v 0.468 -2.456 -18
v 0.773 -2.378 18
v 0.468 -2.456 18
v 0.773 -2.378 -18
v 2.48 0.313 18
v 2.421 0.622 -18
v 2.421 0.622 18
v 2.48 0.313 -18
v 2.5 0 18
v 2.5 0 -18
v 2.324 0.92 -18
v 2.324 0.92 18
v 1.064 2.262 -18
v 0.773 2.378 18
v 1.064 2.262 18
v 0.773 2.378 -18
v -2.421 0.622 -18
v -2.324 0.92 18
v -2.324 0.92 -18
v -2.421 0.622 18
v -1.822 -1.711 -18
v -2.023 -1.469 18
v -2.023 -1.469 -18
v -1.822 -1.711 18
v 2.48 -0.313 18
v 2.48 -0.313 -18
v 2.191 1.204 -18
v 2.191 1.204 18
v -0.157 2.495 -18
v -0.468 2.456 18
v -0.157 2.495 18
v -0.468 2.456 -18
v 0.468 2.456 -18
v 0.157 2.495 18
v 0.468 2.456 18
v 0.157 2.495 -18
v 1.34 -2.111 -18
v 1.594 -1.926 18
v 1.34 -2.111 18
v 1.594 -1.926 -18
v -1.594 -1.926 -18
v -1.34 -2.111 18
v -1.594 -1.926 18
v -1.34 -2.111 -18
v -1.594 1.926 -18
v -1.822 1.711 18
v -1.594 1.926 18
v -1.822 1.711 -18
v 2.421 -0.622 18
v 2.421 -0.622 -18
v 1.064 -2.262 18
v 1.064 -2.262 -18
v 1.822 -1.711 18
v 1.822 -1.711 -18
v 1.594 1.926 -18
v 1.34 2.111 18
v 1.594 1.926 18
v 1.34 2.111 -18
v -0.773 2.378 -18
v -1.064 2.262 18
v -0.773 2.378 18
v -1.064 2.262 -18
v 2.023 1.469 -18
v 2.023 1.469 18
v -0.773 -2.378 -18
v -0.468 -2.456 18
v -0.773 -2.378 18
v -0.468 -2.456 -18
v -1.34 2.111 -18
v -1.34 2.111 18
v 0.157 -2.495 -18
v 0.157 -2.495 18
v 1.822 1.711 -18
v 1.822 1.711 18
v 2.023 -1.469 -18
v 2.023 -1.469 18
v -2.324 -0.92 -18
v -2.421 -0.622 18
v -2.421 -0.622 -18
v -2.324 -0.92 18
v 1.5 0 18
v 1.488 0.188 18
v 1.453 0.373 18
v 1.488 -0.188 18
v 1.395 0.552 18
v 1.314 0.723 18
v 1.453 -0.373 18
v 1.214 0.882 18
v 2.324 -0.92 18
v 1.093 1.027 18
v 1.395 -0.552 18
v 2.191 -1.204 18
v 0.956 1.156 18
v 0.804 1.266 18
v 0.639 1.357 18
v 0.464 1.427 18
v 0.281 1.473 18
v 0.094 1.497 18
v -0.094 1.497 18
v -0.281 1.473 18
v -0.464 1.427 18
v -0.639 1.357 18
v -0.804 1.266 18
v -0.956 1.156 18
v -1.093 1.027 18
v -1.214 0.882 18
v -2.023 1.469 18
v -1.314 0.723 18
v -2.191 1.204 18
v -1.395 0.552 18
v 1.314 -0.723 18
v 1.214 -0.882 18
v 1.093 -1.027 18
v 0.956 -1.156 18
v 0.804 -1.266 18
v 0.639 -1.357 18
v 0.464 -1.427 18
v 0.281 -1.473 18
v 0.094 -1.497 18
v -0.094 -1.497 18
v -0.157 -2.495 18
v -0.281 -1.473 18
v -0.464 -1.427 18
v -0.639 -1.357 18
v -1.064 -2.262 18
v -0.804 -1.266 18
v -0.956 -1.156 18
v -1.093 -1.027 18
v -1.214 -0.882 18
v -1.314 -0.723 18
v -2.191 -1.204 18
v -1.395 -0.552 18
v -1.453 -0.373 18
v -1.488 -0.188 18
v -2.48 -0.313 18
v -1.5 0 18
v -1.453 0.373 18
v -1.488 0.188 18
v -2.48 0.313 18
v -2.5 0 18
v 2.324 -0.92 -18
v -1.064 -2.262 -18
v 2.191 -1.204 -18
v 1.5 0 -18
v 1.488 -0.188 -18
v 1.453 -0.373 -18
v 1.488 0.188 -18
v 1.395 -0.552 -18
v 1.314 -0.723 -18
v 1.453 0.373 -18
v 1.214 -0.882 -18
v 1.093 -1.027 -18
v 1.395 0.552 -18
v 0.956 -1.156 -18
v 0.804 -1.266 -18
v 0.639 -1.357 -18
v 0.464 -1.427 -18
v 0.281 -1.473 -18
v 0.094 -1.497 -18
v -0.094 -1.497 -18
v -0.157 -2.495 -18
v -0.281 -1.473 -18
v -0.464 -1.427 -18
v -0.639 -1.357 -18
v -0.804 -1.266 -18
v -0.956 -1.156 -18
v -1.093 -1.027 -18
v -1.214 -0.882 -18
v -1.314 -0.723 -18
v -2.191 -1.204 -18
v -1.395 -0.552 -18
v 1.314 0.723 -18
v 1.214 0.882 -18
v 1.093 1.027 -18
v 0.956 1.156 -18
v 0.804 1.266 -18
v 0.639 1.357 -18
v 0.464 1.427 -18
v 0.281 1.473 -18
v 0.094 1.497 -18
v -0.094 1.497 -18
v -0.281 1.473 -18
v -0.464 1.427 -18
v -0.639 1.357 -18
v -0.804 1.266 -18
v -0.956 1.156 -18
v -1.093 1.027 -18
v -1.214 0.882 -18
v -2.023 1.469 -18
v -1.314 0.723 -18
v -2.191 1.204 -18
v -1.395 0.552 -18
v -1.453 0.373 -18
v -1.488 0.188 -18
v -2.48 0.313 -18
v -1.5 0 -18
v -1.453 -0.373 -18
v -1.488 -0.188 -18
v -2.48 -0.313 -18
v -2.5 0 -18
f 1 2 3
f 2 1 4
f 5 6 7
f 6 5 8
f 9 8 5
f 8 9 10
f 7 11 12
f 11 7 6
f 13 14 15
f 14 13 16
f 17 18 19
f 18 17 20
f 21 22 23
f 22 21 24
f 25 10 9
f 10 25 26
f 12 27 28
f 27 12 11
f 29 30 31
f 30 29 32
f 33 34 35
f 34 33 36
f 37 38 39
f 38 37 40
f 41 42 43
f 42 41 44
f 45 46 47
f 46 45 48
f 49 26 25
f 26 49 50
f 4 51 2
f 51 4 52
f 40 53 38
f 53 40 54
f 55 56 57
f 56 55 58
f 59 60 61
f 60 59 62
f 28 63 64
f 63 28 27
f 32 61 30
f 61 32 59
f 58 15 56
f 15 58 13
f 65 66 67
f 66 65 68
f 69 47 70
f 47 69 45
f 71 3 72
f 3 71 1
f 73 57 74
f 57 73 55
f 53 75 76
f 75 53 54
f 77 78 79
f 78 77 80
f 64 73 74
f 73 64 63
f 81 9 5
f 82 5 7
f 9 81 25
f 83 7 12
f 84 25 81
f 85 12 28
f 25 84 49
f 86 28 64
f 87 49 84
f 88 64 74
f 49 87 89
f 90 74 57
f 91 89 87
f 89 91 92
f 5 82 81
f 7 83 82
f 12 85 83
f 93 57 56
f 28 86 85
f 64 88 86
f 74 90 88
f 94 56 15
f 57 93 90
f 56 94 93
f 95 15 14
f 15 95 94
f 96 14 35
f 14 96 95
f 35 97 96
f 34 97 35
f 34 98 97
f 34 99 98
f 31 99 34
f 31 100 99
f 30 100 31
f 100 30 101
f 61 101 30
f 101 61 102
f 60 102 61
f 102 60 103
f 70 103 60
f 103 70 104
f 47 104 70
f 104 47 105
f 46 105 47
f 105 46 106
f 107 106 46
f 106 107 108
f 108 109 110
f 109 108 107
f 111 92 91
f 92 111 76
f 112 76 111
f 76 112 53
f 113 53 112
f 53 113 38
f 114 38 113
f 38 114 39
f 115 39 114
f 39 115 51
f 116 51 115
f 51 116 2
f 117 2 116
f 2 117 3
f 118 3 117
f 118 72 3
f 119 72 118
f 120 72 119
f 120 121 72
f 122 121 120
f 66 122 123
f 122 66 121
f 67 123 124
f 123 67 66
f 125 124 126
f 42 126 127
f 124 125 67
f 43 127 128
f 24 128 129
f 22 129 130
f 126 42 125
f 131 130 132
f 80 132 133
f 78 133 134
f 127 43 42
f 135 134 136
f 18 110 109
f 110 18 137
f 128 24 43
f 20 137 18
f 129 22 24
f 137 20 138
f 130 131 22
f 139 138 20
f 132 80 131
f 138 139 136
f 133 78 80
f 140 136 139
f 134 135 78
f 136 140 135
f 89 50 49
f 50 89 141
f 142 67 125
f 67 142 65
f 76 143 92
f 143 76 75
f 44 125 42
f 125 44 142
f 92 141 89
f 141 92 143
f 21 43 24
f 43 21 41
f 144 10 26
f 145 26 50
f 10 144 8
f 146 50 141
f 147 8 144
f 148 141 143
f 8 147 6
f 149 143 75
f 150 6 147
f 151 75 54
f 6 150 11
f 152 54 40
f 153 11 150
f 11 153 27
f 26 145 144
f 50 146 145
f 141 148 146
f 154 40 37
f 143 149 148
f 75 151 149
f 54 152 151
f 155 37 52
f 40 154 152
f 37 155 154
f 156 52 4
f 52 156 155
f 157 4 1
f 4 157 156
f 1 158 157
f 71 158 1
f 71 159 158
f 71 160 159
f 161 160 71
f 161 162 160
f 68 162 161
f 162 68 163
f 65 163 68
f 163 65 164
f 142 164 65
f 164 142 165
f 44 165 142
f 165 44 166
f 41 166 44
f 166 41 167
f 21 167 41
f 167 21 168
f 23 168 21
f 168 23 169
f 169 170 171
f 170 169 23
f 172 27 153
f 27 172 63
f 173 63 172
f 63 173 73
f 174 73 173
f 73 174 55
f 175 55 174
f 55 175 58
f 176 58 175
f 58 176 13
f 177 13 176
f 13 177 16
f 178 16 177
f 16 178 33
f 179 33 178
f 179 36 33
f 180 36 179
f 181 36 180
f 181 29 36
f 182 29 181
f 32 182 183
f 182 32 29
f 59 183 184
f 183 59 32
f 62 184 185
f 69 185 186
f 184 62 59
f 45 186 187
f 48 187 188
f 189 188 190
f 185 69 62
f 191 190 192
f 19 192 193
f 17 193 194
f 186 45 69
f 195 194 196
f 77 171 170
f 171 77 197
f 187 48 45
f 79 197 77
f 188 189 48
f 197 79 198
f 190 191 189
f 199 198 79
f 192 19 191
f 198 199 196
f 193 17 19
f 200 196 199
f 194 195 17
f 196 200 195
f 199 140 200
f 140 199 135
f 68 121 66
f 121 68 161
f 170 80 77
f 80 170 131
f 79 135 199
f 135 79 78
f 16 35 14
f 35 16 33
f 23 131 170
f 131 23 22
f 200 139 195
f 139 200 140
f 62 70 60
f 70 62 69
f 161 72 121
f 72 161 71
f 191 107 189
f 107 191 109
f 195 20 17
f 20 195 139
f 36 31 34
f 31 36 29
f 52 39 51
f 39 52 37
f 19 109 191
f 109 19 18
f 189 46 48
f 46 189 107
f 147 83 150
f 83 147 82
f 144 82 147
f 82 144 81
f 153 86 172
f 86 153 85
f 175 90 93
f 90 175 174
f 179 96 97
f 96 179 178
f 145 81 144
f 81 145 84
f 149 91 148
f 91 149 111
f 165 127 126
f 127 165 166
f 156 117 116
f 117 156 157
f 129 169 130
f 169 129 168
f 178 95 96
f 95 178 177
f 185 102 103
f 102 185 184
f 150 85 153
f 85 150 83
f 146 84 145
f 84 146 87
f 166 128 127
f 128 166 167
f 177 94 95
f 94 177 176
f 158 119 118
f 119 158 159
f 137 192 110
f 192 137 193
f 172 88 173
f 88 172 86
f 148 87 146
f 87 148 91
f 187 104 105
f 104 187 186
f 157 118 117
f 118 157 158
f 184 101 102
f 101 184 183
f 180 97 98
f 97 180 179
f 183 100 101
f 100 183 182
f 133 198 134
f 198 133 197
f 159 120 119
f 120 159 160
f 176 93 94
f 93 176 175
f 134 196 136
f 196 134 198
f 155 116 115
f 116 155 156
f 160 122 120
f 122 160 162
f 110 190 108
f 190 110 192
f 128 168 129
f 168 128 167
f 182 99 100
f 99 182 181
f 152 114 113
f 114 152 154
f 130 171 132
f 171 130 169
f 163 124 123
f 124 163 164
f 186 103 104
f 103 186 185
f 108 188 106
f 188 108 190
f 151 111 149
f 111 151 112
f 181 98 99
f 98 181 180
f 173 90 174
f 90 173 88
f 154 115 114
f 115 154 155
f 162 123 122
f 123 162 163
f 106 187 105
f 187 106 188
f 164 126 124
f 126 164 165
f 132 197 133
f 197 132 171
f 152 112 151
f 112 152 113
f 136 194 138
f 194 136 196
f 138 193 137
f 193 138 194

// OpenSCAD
$fn = 50;


difference() {
	union() {
		translate(v = [0, 0, -18.0000000000]) {
			cylinder(h = 36, r = 2.5000000000);
		}
	}
	union() {
		translate(v = [0, 0, -100.0000000000]) {
			cylinder(h = 200, r = 1.5000000000);
		}
	}
}
